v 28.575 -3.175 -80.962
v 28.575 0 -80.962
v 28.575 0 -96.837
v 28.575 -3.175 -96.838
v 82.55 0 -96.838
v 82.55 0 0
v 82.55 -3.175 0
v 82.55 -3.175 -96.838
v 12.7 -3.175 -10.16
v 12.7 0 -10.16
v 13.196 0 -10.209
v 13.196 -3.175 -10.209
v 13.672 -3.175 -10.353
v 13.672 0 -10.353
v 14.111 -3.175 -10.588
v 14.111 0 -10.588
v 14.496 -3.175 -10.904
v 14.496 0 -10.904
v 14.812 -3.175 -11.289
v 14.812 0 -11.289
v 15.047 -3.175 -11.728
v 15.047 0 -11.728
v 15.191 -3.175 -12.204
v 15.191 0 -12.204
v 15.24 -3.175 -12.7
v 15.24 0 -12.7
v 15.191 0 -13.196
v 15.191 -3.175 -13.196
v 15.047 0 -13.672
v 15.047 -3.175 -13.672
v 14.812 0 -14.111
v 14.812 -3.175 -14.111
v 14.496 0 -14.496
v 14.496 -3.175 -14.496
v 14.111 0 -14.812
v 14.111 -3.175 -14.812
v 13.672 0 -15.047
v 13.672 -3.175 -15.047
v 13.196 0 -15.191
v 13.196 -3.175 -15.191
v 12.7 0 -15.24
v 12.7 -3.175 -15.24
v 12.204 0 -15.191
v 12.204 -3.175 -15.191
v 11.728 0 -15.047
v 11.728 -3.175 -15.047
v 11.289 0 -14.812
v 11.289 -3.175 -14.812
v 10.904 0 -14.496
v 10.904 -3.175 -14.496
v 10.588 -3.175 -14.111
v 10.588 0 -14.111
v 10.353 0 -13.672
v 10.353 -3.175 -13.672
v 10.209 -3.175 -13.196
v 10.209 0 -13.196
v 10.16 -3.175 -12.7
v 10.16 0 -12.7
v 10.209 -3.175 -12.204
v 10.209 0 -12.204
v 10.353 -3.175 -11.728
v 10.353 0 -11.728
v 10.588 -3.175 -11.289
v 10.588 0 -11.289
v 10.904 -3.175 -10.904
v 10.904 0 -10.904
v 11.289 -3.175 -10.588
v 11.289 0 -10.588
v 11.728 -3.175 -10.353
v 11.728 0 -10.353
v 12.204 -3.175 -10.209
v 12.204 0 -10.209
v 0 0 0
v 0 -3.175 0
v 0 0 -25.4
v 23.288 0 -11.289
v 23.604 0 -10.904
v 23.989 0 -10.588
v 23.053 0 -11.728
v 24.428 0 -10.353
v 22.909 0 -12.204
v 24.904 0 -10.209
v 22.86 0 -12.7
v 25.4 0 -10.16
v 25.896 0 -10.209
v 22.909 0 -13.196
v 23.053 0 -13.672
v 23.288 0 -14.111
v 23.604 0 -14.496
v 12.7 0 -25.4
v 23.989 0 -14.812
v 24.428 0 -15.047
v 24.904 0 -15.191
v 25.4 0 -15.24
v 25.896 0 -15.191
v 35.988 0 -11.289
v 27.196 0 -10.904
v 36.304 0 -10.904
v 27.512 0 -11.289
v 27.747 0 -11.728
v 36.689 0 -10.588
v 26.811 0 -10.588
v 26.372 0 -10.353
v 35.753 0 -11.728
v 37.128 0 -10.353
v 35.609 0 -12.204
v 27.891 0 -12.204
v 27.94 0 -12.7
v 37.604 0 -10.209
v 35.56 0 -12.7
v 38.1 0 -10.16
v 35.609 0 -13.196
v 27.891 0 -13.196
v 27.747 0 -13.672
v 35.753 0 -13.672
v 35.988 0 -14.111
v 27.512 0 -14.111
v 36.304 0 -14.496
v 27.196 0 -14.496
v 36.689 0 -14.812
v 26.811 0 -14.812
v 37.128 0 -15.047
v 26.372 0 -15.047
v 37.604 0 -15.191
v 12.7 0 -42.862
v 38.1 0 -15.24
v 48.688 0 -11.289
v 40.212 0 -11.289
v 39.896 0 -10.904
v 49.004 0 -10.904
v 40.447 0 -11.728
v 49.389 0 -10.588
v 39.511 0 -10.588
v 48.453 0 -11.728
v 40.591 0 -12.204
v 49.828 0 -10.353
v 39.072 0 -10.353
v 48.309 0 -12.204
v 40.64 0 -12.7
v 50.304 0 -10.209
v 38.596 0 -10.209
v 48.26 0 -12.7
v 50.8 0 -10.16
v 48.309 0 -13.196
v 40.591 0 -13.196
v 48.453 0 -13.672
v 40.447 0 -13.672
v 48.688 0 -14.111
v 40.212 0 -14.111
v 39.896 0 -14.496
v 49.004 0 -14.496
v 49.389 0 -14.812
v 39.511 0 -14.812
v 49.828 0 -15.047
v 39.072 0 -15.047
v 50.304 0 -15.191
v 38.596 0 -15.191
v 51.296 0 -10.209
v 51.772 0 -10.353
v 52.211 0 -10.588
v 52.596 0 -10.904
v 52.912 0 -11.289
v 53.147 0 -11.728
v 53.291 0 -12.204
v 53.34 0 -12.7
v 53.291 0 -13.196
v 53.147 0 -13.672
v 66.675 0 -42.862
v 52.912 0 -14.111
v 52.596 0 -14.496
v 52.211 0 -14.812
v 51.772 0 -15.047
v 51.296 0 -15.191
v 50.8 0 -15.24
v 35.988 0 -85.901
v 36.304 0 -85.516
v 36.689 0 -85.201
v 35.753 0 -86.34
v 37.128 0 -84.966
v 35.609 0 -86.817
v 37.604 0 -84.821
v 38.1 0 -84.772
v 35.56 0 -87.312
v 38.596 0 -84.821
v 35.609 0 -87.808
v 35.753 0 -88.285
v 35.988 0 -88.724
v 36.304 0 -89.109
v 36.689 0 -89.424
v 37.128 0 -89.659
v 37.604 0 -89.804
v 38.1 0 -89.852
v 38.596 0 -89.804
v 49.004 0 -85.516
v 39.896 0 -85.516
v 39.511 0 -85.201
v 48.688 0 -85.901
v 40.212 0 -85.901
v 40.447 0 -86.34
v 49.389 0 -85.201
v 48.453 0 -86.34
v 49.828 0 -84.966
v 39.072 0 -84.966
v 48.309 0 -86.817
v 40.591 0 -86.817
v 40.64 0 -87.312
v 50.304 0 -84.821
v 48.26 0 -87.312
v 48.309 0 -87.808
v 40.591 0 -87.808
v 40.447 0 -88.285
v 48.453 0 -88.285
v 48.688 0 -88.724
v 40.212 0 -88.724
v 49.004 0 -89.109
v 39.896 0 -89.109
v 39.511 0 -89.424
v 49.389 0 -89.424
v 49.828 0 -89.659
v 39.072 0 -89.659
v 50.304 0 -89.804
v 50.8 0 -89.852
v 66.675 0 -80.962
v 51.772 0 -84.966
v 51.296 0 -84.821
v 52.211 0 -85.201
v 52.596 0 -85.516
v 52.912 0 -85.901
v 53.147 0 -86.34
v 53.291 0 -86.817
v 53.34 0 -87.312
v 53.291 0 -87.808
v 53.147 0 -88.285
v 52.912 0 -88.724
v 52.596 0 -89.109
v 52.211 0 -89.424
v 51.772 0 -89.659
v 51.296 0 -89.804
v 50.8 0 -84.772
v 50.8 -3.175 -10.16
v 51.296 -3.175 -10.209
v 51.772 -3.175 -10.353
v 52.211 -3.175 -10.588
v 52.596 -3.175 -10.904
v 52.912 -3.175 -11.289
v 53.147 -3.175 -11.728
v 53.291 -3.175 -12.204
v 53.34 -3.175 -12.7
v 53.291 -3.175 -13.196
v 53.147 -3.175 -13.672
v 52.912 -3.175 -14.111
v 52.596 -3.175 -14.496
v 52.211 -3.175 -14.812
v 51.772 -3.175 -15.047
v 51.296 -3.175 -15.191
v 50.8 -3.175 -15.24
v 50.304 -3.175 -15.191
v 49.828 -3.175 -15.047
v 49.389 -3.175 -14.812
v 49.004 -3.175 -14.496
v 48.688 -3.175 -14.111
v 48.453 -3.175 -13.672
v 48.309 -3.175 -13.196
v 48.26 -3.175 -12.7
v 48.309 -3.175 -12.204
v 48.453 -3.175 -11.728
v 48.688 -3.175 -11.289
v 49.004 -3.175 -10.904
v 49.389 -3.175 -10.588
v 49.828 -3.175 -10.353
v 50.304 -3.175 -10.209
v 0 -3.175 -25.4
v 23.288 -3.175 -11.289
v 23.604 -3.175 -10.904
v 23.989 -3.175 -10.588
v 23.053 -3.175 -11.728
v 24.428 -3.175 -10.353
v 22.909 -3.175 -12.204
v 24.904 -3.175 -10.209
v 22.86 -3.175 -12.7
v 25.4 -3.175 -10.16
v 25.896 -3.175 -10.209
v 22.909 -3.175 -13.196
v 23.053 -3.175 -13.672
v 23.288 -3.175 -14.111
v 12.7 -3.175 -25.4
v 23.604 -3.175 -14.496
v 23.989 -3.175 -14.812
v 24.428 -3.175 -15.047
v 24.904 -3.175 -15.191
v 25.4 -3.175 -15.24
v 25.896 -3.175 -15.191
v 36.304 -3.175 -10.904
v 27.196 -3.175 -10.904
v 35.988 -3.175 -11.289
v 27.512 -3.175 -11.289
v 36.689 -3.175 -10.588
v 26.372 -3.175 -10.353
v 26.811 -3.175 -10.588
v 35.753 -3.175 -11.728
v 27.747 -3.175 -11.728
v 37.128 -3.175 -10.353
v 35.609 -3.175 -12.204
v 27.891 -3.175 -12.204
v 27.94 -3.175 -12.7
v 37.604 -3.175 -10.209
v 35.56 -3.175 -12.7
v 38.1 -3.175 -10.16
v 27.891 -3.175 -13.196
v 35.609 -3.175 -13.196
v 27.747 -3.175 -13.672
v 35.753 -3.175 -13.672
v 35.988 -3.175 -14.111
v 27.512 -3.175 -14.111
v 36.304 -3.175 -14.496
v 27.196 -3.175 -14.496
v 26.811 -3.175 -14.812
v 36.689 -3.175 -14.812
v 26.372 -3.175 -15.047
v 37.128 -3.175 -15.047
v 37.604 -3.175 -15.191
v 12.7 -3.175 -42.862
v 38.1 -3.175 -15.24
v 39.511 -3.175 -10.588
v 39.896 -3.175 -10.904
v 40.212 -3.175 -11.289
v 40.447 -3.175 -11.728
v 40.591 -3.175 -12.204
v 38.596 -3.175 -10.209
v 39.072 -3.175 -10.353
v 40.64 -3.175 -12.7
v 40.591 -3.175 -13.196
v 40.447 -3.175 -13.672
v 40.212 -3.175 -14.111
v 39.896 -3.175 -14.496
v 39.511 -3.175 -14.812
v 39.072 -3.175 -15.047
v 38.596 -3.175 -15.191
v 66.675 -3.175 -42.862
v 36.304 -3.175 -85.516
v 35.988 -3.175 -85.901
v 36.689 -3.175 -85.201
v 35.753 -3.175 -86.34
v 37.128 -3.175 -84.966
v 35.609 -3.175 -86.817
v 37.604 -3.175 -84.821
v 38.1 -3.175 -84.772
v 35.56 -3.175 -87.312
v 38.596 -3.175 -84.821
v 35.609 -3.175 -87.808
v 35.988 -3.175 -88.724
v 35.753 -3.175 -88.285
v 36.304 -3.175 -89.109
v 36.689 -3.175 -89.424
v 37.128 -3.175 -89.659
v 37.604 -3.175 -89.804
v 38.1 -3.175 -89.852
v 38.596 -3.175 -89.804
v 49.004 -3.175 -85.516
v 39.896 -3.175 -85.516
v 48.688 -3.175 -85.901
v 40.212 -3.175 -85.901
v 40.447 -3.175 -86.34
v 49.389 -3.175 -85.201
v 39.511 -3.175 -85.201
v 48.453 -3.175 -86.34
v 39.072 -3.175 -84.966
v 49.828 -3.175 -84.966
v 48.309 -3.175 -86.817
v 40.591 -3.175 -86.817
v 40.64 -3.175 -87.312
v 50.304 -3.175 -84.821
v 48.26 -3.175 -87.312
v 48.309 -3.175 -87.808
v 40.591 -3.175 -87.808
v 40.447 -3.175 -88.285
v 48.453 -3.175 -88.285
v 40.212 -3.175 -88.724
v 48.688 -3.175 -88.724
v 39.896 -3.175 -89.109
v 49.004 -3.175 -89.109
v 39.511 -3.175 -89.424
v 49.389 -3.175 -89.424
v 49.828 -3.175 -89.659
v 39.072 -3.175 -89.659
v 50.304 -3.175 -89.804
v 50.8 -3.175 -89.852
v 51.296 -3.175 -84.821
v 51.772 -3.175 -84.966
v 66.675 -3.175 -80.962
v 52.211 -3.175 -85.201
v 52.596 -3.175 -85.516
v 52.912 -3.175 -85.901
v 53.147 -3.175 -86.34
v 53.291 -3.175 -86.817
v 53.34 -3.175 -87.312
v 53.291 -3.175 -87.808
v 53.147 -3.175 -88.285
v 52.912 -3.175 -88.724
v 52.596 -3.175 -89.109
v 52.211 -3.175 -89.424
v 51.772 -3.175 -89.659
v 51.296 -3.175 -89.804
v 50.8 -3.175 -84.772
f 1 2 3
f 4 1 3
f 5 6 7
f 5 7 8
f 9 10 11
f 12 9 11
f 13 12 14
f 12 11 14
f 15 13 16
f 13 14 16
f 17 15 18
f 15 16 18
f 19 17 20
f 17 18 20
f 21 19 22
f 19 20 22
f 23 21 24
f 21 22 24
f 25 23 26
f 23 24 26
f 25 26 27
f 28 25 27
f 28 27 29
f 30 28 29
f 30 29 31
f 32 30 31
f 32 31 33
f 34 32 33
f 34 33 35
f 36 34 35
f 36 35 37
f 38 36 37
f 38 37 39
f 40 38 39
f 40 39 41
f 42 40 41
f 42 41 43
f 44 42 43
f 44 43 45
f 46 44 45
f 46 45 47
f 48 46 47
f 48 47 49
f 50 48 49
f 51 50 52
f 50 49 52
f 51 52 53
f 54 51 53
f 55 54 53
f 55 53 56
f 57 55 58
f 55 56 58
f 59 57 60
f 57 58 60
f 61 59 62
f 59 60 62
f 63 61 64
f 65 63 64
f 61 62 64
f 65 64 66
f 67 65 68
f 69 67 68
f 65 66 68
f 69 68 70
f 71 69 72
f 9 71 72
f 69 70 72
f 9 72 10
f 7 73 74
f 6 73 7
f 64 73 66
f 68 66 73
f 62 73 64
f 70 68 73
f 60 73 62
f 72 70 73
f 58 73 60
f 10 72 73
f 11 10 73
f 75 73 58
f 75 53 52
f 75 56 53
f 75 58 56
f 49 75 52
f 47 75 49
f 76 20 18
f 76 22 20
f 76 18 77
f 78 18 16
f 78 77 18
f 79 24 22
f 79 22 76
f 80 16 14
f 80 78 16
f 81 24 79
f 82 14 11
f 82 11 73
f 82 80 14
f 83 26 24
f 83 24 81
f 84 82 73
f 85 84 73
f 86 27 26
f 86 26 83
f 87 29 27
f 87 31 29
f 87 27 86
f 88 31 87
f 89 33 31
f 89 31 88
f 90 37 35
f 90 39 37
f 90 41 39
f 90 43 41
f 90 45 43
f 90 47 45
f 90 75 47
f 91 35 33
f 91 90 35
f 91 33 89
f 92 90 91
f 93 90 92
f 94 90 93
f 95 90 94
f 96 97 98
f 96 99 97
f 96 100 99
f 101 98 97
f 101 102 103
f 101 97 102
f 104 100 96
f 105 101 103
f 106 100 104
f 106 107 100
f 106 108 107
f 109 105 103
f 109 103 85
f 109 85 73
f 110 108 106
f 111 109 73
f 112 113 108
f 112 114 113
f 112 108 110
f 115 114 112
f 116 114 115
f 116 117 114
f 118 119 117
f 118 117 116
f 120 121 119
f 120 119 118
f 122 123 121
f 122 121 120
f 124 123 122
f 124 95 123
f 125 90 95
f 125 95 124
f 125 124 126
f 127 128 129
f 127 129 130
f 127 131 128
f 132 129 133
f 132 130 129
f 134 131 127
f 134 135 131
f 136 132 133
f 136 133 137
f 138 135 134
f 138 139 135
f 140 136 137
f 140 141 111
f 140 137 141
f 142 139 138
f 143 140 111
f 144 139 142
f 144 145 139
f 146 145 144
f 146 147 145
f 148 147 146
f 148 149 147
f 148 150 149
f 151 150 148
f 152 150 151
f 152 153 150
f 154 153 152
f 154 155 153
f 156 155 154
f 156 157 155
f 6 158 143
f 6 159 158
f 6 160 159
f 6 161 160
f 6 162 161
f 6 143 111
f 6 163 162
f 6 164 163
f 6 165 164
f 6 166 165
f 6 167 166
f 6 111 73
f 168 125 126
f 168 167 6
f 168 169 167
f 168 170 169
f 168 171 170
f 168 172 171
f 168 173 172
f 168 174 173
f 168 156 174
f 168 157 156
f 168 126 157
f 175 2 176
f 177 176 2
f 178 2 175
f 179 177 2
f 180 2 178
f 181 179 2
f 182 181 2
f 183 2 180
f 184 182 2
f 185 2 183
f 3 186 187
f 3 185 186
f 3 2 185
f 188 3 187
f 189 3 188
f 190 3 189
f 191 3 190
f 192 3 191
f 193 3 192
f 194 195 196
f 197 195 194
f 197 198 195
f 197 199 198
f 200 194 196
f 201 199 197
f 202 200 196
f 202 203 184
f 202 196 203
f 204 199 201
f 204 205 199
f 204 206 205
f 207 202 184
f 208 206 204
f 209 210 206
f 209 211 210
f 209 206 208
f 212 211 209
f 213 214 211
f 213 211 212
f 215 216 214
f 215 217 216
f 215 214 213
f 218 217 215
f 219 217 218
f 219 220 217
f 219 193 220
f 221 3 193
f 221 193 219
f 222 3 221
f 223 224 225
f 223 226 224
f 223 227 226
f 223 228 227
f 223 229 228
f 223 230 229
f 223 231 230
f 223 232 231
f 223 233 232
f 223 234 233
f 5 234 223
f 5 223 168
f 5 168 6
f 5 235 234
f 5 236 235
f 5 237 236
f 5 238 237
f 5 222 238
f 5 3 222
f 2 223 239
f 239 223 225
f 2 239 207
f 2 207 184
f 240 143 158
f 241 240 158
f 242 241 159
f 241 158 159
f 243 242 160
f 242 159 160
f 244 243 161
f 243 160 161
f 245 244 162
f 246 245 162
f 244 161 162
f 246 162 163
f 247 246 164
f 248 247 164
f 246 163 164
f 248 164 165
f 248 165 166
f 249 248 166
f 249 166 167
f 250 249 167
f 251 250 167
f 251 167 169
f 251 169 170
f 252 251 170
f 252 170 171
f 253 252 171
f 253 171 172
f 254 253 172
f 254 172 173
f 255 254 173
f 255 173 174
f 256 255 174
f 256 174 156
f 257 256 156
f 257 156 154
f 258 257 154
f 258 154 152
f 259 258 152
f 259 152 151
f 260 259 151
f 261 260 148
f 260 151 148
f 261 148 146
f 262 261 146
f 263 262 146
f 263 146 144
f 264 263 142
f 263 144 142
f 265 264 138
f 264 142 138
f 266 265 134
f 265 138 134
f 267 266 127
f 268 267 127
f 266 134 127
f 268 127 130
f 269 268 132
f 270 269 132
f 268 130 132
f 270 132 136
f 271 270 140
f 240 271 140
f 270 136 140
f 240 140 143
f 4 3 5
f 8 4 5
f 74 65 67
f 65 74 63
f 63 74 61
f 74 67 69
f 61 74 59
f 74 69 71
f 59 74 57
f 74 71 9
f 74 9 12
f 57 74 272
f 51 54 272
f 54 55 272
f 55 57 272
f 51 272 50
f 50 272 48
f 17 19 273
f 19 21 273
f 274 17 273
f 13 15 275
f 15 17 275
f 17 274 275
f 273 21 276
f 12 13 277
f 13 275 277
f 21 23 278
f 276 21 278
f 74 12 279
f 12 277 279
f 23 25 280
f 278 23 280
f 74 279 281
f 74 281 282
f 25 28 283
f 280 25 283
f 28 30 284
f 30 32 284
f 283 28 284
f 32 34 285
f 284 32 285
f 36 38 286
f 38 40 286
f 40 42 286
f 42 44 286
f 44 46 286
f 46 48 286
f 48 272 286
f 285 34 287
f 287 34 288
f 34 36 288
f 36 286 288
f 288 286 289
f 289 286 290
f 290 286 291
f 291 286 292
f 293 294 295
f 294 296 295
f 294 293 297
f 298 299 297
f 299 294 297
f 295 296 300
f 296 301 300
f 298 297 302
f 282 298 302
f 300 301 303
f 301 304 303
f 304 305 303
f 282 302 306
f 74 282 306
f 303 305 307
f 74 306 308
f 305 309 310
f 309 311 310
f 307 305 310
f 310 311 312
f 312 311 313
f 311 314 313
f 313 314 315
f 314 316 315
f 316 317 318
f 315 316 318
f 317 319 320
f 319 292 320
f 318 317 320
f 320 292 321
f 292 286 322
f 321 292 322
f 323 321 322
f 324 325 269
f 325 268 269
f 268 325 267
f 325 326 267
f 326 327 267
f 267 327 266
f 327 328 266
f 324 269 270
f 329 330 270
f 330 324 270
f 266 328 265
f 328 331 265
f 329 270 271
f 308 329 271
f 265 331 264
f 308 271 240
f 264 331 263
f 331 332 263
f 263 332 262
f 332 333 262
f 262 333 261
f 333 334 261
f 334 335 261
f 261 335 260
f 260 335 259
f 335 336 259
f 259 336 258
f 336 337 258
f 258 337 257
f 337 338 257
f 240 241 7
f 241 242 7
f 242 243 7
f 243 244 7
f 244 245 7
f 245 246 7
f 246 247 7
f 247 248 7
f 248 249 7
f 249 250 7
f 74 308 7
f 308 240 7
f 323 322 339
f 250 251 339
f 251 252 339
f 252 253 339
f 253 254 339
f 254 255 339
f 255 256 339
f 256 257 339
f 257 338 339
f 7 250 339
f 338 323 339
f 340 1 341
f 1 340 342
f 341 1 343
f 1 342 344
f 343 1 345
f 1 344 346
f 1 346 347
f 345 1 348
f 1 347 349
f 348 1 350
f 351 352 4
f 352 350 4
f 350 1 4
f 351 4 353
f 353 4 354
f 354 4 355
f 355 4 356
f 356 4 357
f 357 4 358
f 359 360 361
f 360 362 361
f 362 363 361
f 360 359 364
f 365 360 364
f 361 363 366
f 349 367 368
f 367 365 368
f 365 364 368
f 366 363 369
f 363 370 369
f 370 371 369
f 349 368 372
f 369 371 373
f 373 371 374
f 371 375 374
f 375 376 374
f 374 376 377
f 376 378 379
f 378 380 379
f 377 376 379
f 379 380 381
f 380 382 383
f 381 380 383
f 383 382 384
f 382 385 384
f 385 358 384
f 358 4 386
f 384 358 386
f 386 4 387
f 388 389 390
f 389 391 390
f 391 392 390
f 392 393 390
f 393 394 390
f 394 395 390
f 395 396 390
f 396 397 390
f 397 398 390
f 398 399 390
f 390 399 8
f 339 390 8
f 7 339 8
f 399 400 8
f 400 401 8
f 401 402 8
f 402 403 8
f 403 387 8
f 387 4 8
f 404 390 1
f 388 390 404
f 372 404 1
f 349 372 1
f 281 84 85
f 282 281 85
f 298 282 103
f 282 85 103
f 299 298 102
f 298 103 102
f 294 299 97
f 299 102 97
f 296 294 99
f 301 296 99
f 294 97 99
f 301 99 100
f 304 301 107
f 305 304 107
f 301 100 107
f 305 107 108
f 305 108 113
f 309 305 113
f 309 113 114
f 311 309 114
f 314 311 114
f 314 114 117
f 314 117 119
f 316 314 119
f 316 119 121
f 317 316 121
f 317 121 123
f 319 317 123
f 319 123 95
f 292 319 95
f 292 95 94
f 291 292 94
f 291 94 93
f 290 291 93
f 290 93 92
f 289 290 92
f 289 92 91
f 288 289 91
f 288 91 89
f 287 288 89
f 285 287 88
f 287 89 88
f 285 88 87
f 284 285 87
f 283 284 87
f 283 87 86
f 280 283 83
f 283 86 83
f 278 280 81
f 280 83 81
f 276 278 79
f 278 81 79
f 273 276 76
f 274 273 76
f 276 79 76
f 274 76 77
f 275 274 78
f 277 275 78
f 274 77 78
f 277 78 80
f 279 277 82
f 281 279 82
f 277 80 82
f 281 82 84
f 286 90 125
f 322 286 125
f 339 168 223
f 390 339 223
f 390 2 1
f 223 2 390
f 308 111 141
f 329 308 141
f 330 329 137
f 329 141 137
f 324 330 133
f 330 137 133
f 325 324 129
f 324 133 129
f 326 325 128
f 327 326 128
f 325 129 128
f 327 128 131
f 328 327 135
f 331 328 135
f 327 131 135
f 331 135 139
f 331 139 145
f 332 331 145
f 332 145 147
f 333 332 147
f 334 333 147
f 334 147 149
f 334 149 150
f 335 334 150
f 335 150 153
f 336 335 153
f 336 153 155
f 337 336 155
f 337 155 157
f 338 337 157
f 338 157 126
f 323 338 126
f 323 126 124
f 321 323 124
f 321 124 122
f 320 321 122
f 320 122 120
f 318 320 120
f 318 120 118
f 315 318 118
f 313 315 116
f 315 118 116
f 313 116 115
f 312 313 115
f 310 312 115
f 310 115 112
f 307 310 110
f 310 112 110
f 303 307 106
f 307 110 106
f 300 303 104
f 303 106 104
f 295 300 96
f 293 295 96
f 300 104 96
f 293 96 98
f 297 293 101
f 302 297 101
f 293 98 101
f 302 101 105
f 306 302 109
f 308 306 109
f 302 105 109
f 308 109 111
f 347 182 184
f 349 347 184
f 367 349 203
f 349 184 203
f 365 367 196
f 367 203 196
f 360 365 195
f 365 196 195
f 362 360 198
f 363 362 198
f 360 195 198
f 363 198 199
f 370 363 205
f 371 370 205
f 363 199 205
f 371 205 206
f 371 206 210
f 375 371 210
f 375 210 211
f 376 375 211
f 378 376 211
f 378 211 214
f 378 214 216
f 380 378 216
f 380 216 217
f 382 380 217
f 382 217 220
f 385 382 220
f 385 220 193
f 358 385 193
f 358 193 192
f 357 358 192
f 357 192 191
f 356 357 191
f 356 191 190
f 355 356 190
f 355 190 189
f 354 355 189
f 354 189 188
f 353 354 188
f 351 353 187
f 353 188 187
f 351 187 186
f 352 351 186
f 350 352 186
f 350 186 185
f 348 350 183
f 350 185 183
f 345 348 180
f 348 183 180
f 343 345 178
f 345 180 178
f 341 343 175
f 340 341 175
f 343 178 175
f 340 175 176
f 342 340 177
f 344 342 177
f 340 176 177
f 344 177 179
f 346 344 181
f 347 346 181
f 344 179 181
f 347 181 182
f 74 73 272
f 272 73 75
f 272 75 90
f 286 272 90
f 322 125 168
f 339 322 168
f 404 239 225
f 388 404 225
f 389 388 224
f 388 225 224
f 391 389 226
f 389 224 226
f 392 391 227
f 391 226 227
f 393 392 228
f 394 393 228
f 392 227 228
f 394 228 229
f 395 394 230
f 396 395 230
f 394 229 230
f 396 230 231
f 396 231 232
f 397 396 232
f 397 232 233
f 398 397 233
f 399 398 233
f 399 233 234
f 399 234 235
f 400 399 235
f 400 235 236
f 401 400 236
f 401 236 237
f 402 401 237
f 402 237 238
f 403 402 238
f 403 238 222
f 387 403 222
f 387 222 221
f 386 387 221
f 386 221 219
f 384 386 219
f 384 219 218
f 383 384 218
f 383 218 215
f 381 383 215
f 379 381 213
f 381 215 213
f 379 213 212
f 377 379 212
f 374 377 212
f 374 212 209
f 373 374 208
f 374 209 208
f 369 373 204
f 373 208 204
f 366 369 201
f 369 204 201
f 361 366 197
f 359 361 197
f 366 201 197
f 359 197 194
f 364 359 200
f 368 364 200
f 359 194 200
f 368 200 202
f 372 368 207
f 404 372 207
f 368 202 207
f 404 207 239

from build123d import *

# Parameters (mm, degrees)
SKETCH1_W          = 82.55
SKETCH1_H          = 96.8375
SKETCH1_W_2        = 38.1
SKETCH1_H_2        = 38.1
BASE_FLANGE2_DEPTH = 3.175
SKETCH3_W          = 12.7
SKETCH3_H          = 71.4375
CUT_EXTRUDE2_DEPTH = 128.287409162
SKETCH2_R          = 2.54
CUT_EXTRUDE1_DEPTH = 128.287409162
SKETCH5_W          = 15.875
SKETCH5_H          = 53.975
CUT_EXTRUDE6_DEPTH = 128.287409162
SKETCH7_R          = 2.54
CUT_EXTRUDE7_DEPTH = 128.287409162


# Sheet-metal steps are written as plain solids
with BuildPart() as part:
    # Base-Flange2: sheet metal written as solids
    # Sketch1 → Base-Flange2 (new body)
    with BuildSketch(Plane(origin=(0, 0, 0), x_dir=(1, 0, 0), z_dir=(0, 1, 0))):
        with Locations((41.275, 48.41875)):
            Rectangle(SKETCH1_W, SKETCH1_H)
        with Locations((47.625, 61.9125)):
            Rectangle(SKETCH1_W_2, SKETCH1_H_2, mode=Mode.SUBTRACT)
    extrude(amount=-BASE_FLANGE2_DEPTH)

    # Sketch3 → Cut-Extrude2 (cut, through all)
    with BuildSketch(Plane(origin=(0, 0, 0), x_dir=(1, 0, 0), z_dir=(0, 1, 0))):
        with Locations((6.35, 61.11875)):
            Rectangle(SKETCH3_W, SKETCH3_H)
    extrude(amount=-CUT_EXTRUDE2_DEPTH, mode=Mode.SUBTRACT)

    # Sketch2 → Cut-Extrude1 (cut, through all)
    with BuildSketch(Plane(origin=(0, 0, 0), x_dir=(1, 0, 0), z_dir=(0, 1, 0))):
        with Locations(Location((12.7, 12.7, 0), (0, 0, 270))):
            Circle(SKETCH2_R)
        with Locations(Location((25.4, 12.7, 0), (0, 0, 270))):
            Circle(SKETCH2_R)
        with Locations(Location((38.1, 12.7, 0), (0, 0, 270))):
            Circle(SKETCH2_R)
        with Locations(Location((50.8, 12.7, 0), (0, 0, 270))):
            Circle(SKETCH2_R)
    extrude(amount=-CUT_EXTRUDE1_DEPTH, mode=Mode.SUBTRACT)

    # Sketch5 → Cut-Extrude6 (cut, through all)
    with BuildSketch(Plane(origin=(0, 0, 0), x_dir=(1, 0, 0), z_dir=(0, 1, 0))):
        with Locations((20.6375, 69.85)):
            Rectangle(SKETCH5_W, SKETCH5_H)
    extrude(amount=-CUT_EXTRUDE6_DEPTH, mode=Mode.SUBTRACT)

    # Sketch7 → Cut-Extrude7 (cut, through all)
    with BuildSketch(Plane(origin=(0, 0, 0), x_dir=(1, 0, 0), z_dir=(0, 1, 0))):
        with Locations(Location((38.1, 87.3125, 0), (0, 0, 270))):
            Circle(SKETCH7_R)
        with Locations(Location((50.8, 87.3125, 0), (0, 0, 270))):
            Circle(SKETCH7_R)
    extrude(amount=-CUT_EXTRUDE7_DEPTH, mode=Mode.SUBTRACT)


solid = part.part
